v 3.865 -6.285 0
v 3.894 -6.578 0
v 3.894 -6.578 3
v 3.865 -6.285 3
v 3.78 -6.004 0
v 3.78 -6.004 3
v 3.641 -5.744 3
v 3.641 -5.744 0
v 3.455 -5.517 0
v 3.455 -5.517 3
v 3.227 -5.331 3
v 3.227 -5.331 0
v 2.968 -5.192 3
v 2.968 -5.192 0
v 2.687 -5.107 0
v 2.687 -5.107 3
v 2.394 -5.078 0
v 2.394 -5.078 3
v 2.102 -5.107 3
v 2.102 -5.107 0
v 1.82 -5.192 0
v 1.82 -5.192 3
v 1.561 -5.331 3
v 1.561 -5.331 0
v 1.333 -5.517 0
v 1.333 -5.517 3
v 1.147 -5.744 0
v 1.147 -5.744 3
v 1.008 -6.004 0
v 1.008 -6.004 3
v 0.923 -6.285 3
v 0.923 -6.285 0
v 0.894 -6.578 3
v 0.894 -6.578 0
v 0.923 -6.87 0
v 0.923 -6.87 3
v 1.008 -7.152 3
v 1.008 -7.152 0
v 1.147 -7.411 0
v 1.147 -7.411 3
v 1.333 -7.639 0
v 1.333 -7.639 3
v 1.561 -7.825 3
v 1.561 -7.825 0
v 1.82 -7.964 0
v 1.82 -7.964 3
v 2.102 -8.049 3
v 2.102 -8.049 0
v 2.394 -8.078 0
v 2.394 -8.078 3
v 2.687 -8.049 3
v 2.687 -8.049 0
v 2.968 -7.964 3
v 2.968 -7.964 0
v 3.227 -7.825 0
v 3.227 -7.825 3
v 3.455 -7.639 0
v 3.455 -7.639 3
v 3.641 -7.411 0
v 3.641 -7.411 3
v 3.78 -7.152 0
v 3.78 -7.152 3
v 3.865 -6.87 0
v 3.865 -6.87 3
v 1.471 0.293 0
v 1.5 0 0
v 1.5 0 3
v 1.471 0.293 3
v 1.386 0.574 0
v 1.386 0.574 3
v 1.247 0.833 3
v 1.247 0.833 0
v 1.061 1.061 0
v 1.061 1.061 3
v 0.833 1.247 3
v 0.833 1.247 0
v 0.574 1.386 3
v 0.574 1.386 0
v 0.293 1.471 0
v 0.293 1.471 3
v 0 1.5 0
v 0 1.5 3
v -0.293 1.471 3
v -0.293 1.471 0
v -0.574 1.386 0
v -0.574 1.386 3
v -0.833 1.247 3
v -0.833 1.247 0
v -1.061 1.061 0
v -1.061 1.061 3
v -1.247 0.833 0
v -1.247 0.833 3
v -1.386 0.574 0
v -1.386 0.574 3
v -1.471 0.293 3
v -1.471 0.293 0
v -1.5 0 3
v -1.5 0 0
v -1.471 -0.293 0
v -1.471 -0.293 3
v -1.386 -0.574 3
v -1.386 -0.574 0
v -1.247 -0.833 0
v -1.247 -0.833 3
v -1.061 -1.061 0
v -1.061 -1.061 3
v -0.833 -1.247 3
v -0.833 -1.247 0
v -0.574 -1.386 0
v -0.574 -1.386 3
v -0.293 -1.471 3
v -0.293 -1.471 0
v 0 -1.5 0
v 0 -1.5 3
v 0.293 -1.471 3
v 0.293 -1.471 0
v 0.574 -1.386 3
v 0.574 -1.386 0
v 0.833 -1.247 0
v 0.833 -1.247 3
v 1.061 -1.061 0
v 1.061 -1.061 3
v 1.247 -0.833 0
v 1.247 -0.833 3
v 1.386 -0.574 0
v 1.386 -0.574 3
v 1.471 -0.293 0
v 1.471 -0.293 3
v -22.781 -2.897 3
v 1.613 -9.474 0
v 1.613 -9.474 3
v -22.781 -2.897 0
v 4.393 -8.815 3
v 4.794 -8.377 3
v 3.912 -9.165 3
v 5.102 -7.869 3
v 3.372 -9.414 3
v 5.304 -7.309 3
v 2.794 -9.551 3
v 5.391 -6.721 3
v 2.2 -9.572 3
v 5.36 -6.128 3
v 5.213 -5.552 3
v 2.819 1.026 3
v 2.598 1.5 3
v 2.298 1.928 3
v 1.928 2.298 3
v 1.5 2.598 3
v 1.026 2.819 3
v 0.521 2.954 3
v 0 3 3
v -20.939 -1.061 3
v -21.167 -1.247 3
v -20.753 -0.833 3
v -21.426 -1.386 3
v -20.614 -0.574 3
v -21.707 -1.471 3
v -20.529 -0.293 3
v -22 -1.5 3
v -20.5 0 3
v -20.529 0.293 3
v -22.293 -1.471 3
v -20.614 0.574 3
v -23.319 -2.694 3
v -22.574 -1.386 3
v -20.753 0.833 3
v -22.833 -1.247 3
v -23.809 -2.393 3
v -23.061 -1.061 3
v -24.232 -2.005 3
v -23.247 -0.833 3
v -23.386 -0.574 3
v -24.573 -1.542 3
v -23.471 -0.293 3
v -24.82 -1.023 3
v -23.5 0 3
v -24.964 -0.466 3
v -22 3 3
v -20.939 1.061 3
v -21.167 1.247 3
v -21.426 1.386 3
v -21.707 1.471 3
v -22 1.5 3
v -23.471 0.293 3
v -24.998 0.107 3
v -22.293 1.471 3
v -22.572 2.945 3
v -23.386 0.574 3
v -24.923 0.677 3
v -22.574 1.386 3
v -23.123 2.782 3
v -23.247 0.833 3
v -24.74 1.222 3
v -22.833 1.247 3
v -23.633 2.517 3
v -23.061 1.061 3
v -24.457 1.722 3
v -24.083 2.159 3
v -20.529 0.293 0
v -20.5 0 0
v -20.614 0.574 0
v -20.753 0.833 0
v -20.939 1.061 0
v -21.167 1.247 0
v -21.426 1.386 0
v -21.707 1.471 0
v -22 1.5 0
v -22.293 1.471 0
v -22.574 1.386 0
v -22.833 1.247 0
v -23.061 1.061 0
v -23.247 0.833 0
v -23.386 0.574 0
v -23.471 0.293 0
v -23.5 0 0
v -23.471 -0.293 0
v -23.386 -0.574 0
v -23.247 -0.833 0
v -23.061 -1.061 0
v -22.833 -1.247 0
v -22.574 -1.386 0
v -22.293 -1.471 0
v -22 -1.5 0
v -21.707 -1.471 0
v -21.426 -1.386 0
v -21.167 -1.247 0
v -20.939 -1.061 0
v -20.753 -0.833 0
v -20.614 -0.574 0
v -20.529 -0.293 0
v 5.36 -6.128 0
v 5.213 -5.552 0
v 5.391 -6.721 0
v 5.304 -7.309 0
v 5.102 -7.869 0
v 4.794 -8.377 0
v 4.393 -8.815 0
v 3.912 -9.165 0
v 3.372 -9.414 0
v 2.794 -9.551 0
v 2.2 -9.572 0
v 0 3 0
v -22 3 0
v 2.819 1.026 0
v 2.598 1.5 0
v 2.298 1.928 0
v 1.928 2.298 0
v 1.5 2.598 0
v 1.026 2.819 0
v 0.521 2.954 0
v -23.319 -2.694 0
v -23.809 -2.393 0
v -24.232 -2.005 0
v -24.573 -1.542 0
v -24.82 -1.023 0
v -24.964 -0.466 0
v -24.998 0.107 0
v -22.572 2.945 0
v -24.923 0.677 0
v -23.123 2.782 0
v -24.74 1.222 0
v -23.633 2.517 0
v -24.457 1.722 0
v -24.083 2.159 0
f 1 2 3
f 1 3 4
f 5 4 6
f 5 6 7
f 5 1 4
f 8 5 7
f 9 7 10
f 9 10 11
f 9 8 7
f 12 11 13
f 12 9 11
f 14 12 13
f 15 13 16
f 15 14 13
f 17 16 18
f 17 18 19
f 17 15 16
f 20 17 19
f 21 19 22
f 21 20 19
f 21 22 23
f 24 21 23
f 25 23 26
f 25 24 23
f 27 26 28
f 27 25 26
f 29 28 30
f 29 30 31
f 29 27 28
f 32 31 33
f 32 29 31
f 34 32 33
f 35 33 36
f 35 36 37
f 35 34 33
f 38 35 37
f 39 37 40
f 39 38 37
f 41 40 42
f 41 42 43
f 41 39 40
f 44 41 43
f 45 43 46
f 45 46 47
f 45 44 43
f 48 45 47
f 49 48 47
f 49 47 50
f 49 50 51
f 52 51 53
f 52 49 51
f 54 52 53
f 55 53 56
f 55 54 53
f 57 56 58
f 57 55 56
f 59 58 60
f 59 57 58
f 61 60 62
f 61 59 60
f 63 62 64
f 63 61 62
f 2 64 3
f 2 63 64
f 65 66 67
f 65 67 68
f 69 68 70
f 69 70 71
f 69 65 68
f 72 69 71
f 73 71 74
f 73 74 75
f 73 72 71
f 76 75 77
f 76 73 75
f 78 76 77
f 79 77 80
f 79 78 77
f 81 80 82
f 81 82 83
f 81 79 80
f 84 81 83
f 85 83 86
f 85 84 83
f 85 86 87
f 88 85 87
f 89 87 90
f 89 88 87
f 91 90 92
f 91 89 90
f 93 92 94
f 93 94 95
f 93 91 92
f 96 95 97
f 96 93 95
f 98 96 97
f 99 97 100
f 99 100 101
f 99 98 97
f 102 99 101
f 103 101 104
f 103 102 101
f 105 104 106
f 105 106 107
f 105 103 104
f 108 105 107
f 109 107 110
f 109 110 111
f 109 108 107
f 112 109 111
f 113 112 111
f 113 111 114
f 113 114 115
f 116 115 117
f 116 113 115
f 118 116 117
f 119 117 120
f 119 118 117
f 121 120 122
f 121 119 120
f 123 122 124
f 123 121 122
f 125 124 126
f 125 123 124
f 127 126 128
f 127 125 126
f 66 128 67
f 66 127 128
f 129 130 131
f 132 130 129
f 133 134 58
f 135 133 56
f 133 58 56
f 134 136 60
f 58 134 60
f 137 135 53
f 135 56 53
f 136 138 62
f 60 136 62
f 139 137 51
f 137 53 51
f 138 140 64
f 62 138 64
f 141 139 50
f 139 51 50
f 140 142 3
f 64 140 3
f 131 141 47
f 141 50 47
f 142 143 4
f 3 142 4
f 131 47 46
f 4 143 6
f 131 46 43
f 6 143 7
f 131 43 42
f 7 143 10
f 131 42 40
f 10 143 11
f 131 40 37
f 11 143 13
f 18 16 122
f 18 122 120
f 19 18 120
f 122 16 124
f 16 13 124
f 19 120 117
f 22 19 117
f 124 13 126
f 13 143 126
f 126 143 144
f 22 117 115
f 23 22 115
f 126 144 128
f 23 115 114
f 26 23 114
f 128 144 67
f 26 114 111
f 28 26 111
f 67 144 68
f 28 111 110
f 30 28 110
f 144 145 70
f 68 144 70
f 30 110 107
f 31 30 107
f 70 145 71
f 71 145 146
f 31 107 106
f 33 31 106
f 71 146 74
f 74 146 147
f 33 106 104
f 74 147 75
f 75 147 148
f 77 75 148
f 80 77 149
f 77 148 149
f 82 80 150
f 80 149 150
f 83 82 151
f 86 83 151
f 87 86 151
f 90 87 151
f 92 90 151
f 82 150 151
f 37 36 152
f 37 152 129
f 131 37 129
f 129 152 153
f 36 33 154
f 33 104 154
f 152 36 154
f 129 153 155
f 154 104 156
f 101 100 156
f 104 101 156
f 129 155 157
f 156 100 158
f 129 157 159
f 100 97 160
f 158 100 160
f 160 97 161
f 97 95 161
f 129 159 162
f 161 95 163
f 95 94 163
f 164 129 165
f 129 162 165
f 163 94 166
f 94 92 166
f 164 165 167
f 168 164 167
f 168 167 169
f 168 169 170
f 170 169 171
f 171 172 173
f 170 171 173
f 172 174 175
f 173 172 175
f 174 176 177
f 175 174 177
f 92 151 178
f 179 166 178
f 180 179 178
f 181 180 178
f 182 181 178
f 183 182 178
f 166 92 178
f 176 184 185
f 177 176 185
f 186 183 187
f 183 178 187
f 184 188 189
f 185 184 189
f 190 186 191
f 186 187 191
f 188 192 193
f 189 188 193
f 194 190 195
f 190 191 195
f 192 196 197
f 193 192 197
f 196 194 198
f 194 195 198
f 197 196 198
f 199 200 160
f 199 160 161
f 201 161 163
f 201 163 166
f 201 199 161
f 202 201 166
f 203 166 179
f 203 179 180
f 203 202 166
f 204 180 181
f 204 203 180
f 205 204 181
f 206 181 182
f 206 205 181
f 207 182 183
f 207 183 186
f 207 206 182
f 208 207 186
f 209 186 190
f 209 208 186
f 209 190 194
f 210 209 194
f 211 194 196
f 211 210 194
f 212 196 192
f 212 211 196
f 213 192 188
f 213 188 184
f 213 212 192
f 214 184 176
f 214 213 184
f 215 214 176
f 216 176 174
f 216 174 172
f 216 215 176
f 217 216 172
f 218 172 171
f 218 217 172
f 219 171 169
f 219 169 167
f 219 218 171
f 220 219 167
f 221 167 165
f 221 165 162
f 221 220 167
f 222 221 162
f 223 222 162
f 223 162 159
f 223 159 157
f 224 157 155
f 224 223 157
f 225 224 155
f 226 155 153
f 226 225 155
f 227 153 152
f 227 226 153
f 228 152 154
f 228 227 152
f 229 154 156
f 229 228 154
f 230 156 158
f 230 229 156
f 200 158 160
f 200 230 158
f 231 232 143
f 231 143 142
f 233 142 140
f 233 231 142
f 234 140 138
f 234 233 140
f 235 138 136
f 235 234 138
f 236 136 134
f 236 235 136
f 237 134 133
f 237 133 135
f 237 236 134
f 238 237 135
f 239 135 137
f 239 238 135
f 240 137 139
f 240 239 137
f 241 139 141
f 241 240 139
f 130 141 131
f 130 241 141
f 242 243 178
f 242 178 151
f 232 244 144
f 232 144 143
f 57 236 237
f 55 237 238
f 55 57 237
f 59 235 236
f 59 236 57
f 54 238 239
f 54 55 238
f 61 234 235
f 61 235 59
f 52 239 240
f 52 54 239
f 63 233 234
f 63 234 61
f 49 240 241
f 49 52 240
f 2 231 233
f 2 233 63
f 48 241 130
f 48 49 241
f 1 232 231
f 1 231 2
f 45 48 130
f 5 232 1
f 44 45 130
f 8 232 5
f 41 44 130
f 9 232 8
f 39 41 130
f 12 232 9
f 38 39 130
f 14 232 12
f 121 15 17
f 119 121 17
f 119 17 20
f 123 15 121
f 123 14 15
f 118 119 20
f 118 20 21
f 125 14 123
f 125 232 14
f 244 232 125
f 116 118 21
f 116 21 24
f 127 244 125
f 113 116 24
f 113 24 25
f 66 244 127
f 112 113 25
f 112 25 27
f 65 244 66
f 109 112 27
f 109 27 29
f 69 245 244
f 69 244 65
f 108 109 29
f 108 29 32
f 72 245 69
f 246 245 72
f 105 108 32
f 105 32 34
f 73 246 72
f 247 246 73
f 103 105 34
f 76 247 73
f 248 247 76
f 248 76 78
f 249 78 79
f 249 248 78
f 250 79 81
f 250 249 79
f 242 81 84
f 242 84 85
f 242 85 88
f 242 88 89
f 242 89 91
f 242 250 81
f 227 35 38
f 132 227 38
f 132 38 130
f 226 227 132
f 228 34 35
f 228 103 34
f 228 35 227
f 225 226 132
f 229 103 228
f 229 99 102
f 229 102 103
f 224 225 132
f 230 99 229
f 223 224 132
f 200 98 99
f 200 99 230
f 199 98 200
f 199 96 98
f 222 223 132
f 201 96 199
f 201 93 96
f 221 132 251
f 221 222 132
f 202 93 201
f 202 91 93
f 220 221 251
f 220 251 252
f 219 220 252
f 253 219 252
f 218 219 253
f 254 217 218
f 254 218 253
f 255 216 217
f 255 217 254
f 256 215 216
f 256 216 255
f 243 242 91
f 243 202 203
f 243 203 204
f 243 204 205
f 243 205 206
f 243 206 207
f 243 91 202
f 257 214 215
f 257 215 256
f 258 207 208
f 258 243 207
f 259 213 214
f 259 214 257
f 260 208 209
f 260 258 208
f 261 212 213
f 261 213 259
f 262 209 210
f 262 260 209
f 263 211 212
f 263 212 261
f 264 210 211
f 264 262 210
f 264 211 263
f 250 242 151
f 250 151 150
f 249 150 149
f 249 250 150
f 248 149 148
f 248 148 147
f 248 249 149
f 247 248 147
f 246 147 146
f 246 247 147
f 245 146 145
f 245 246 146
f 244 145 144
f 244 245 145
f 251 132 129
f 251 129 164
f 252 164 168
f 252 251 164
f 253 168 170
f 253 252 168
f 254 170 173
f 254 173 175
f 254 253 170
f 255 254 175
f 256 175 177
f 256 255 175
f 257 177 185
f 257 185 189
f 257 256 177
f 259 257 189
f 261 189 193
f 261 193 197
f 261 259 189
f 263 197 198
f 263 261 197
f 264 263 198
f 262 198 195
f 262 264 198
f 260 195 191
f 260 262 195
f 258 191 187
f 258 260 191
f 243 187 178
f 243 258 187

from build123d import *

# Parameters (mm, degrees)
SKETCH2_R           = 1.5
BOSS_EXTRUDE1_DEPTH = 3


with BuildPart() as part:
    # Sketch2 → Boss-Extrude1 (new body)
    with BuildSketch(Plane.XY):
        with BuildLine():
            Line((-22, 3), (0, 3))
            ThreePointArc((0, 3), (1.720729309, 2.457456133), (2.819077862, 1.02606043))
            Line((2.819077862, 1.02606043), (5.213218866, -5.551787916))
            ThreePointArc((5.213218866, -5.551787916), (4.604366119, -8.606371192), (1.613091911, -9.474391512))
            Line((1.613091911, -9.474391512), (-22.781049092, -2.896543167))
            ThreePointArc((-22.781049092, -2.896543167), (-24.974023327, 0.393935591), (-22, 3))
        make_face()
        with Locations((-22, 0)):
            Circle(SKETCH2_R, mode=Mode.SUBTRACT)
        Circle(SKETCH2_R, mode=Mode.SUBTRACT)
        with Locations((2.394141003, -6.577848346)):
            Circle(SKETCH2_R, mode=Mode.SUBTRACT)
    extrude(amount=BOSS_EXTRUDE1_DEPTH)


solid = part.part
